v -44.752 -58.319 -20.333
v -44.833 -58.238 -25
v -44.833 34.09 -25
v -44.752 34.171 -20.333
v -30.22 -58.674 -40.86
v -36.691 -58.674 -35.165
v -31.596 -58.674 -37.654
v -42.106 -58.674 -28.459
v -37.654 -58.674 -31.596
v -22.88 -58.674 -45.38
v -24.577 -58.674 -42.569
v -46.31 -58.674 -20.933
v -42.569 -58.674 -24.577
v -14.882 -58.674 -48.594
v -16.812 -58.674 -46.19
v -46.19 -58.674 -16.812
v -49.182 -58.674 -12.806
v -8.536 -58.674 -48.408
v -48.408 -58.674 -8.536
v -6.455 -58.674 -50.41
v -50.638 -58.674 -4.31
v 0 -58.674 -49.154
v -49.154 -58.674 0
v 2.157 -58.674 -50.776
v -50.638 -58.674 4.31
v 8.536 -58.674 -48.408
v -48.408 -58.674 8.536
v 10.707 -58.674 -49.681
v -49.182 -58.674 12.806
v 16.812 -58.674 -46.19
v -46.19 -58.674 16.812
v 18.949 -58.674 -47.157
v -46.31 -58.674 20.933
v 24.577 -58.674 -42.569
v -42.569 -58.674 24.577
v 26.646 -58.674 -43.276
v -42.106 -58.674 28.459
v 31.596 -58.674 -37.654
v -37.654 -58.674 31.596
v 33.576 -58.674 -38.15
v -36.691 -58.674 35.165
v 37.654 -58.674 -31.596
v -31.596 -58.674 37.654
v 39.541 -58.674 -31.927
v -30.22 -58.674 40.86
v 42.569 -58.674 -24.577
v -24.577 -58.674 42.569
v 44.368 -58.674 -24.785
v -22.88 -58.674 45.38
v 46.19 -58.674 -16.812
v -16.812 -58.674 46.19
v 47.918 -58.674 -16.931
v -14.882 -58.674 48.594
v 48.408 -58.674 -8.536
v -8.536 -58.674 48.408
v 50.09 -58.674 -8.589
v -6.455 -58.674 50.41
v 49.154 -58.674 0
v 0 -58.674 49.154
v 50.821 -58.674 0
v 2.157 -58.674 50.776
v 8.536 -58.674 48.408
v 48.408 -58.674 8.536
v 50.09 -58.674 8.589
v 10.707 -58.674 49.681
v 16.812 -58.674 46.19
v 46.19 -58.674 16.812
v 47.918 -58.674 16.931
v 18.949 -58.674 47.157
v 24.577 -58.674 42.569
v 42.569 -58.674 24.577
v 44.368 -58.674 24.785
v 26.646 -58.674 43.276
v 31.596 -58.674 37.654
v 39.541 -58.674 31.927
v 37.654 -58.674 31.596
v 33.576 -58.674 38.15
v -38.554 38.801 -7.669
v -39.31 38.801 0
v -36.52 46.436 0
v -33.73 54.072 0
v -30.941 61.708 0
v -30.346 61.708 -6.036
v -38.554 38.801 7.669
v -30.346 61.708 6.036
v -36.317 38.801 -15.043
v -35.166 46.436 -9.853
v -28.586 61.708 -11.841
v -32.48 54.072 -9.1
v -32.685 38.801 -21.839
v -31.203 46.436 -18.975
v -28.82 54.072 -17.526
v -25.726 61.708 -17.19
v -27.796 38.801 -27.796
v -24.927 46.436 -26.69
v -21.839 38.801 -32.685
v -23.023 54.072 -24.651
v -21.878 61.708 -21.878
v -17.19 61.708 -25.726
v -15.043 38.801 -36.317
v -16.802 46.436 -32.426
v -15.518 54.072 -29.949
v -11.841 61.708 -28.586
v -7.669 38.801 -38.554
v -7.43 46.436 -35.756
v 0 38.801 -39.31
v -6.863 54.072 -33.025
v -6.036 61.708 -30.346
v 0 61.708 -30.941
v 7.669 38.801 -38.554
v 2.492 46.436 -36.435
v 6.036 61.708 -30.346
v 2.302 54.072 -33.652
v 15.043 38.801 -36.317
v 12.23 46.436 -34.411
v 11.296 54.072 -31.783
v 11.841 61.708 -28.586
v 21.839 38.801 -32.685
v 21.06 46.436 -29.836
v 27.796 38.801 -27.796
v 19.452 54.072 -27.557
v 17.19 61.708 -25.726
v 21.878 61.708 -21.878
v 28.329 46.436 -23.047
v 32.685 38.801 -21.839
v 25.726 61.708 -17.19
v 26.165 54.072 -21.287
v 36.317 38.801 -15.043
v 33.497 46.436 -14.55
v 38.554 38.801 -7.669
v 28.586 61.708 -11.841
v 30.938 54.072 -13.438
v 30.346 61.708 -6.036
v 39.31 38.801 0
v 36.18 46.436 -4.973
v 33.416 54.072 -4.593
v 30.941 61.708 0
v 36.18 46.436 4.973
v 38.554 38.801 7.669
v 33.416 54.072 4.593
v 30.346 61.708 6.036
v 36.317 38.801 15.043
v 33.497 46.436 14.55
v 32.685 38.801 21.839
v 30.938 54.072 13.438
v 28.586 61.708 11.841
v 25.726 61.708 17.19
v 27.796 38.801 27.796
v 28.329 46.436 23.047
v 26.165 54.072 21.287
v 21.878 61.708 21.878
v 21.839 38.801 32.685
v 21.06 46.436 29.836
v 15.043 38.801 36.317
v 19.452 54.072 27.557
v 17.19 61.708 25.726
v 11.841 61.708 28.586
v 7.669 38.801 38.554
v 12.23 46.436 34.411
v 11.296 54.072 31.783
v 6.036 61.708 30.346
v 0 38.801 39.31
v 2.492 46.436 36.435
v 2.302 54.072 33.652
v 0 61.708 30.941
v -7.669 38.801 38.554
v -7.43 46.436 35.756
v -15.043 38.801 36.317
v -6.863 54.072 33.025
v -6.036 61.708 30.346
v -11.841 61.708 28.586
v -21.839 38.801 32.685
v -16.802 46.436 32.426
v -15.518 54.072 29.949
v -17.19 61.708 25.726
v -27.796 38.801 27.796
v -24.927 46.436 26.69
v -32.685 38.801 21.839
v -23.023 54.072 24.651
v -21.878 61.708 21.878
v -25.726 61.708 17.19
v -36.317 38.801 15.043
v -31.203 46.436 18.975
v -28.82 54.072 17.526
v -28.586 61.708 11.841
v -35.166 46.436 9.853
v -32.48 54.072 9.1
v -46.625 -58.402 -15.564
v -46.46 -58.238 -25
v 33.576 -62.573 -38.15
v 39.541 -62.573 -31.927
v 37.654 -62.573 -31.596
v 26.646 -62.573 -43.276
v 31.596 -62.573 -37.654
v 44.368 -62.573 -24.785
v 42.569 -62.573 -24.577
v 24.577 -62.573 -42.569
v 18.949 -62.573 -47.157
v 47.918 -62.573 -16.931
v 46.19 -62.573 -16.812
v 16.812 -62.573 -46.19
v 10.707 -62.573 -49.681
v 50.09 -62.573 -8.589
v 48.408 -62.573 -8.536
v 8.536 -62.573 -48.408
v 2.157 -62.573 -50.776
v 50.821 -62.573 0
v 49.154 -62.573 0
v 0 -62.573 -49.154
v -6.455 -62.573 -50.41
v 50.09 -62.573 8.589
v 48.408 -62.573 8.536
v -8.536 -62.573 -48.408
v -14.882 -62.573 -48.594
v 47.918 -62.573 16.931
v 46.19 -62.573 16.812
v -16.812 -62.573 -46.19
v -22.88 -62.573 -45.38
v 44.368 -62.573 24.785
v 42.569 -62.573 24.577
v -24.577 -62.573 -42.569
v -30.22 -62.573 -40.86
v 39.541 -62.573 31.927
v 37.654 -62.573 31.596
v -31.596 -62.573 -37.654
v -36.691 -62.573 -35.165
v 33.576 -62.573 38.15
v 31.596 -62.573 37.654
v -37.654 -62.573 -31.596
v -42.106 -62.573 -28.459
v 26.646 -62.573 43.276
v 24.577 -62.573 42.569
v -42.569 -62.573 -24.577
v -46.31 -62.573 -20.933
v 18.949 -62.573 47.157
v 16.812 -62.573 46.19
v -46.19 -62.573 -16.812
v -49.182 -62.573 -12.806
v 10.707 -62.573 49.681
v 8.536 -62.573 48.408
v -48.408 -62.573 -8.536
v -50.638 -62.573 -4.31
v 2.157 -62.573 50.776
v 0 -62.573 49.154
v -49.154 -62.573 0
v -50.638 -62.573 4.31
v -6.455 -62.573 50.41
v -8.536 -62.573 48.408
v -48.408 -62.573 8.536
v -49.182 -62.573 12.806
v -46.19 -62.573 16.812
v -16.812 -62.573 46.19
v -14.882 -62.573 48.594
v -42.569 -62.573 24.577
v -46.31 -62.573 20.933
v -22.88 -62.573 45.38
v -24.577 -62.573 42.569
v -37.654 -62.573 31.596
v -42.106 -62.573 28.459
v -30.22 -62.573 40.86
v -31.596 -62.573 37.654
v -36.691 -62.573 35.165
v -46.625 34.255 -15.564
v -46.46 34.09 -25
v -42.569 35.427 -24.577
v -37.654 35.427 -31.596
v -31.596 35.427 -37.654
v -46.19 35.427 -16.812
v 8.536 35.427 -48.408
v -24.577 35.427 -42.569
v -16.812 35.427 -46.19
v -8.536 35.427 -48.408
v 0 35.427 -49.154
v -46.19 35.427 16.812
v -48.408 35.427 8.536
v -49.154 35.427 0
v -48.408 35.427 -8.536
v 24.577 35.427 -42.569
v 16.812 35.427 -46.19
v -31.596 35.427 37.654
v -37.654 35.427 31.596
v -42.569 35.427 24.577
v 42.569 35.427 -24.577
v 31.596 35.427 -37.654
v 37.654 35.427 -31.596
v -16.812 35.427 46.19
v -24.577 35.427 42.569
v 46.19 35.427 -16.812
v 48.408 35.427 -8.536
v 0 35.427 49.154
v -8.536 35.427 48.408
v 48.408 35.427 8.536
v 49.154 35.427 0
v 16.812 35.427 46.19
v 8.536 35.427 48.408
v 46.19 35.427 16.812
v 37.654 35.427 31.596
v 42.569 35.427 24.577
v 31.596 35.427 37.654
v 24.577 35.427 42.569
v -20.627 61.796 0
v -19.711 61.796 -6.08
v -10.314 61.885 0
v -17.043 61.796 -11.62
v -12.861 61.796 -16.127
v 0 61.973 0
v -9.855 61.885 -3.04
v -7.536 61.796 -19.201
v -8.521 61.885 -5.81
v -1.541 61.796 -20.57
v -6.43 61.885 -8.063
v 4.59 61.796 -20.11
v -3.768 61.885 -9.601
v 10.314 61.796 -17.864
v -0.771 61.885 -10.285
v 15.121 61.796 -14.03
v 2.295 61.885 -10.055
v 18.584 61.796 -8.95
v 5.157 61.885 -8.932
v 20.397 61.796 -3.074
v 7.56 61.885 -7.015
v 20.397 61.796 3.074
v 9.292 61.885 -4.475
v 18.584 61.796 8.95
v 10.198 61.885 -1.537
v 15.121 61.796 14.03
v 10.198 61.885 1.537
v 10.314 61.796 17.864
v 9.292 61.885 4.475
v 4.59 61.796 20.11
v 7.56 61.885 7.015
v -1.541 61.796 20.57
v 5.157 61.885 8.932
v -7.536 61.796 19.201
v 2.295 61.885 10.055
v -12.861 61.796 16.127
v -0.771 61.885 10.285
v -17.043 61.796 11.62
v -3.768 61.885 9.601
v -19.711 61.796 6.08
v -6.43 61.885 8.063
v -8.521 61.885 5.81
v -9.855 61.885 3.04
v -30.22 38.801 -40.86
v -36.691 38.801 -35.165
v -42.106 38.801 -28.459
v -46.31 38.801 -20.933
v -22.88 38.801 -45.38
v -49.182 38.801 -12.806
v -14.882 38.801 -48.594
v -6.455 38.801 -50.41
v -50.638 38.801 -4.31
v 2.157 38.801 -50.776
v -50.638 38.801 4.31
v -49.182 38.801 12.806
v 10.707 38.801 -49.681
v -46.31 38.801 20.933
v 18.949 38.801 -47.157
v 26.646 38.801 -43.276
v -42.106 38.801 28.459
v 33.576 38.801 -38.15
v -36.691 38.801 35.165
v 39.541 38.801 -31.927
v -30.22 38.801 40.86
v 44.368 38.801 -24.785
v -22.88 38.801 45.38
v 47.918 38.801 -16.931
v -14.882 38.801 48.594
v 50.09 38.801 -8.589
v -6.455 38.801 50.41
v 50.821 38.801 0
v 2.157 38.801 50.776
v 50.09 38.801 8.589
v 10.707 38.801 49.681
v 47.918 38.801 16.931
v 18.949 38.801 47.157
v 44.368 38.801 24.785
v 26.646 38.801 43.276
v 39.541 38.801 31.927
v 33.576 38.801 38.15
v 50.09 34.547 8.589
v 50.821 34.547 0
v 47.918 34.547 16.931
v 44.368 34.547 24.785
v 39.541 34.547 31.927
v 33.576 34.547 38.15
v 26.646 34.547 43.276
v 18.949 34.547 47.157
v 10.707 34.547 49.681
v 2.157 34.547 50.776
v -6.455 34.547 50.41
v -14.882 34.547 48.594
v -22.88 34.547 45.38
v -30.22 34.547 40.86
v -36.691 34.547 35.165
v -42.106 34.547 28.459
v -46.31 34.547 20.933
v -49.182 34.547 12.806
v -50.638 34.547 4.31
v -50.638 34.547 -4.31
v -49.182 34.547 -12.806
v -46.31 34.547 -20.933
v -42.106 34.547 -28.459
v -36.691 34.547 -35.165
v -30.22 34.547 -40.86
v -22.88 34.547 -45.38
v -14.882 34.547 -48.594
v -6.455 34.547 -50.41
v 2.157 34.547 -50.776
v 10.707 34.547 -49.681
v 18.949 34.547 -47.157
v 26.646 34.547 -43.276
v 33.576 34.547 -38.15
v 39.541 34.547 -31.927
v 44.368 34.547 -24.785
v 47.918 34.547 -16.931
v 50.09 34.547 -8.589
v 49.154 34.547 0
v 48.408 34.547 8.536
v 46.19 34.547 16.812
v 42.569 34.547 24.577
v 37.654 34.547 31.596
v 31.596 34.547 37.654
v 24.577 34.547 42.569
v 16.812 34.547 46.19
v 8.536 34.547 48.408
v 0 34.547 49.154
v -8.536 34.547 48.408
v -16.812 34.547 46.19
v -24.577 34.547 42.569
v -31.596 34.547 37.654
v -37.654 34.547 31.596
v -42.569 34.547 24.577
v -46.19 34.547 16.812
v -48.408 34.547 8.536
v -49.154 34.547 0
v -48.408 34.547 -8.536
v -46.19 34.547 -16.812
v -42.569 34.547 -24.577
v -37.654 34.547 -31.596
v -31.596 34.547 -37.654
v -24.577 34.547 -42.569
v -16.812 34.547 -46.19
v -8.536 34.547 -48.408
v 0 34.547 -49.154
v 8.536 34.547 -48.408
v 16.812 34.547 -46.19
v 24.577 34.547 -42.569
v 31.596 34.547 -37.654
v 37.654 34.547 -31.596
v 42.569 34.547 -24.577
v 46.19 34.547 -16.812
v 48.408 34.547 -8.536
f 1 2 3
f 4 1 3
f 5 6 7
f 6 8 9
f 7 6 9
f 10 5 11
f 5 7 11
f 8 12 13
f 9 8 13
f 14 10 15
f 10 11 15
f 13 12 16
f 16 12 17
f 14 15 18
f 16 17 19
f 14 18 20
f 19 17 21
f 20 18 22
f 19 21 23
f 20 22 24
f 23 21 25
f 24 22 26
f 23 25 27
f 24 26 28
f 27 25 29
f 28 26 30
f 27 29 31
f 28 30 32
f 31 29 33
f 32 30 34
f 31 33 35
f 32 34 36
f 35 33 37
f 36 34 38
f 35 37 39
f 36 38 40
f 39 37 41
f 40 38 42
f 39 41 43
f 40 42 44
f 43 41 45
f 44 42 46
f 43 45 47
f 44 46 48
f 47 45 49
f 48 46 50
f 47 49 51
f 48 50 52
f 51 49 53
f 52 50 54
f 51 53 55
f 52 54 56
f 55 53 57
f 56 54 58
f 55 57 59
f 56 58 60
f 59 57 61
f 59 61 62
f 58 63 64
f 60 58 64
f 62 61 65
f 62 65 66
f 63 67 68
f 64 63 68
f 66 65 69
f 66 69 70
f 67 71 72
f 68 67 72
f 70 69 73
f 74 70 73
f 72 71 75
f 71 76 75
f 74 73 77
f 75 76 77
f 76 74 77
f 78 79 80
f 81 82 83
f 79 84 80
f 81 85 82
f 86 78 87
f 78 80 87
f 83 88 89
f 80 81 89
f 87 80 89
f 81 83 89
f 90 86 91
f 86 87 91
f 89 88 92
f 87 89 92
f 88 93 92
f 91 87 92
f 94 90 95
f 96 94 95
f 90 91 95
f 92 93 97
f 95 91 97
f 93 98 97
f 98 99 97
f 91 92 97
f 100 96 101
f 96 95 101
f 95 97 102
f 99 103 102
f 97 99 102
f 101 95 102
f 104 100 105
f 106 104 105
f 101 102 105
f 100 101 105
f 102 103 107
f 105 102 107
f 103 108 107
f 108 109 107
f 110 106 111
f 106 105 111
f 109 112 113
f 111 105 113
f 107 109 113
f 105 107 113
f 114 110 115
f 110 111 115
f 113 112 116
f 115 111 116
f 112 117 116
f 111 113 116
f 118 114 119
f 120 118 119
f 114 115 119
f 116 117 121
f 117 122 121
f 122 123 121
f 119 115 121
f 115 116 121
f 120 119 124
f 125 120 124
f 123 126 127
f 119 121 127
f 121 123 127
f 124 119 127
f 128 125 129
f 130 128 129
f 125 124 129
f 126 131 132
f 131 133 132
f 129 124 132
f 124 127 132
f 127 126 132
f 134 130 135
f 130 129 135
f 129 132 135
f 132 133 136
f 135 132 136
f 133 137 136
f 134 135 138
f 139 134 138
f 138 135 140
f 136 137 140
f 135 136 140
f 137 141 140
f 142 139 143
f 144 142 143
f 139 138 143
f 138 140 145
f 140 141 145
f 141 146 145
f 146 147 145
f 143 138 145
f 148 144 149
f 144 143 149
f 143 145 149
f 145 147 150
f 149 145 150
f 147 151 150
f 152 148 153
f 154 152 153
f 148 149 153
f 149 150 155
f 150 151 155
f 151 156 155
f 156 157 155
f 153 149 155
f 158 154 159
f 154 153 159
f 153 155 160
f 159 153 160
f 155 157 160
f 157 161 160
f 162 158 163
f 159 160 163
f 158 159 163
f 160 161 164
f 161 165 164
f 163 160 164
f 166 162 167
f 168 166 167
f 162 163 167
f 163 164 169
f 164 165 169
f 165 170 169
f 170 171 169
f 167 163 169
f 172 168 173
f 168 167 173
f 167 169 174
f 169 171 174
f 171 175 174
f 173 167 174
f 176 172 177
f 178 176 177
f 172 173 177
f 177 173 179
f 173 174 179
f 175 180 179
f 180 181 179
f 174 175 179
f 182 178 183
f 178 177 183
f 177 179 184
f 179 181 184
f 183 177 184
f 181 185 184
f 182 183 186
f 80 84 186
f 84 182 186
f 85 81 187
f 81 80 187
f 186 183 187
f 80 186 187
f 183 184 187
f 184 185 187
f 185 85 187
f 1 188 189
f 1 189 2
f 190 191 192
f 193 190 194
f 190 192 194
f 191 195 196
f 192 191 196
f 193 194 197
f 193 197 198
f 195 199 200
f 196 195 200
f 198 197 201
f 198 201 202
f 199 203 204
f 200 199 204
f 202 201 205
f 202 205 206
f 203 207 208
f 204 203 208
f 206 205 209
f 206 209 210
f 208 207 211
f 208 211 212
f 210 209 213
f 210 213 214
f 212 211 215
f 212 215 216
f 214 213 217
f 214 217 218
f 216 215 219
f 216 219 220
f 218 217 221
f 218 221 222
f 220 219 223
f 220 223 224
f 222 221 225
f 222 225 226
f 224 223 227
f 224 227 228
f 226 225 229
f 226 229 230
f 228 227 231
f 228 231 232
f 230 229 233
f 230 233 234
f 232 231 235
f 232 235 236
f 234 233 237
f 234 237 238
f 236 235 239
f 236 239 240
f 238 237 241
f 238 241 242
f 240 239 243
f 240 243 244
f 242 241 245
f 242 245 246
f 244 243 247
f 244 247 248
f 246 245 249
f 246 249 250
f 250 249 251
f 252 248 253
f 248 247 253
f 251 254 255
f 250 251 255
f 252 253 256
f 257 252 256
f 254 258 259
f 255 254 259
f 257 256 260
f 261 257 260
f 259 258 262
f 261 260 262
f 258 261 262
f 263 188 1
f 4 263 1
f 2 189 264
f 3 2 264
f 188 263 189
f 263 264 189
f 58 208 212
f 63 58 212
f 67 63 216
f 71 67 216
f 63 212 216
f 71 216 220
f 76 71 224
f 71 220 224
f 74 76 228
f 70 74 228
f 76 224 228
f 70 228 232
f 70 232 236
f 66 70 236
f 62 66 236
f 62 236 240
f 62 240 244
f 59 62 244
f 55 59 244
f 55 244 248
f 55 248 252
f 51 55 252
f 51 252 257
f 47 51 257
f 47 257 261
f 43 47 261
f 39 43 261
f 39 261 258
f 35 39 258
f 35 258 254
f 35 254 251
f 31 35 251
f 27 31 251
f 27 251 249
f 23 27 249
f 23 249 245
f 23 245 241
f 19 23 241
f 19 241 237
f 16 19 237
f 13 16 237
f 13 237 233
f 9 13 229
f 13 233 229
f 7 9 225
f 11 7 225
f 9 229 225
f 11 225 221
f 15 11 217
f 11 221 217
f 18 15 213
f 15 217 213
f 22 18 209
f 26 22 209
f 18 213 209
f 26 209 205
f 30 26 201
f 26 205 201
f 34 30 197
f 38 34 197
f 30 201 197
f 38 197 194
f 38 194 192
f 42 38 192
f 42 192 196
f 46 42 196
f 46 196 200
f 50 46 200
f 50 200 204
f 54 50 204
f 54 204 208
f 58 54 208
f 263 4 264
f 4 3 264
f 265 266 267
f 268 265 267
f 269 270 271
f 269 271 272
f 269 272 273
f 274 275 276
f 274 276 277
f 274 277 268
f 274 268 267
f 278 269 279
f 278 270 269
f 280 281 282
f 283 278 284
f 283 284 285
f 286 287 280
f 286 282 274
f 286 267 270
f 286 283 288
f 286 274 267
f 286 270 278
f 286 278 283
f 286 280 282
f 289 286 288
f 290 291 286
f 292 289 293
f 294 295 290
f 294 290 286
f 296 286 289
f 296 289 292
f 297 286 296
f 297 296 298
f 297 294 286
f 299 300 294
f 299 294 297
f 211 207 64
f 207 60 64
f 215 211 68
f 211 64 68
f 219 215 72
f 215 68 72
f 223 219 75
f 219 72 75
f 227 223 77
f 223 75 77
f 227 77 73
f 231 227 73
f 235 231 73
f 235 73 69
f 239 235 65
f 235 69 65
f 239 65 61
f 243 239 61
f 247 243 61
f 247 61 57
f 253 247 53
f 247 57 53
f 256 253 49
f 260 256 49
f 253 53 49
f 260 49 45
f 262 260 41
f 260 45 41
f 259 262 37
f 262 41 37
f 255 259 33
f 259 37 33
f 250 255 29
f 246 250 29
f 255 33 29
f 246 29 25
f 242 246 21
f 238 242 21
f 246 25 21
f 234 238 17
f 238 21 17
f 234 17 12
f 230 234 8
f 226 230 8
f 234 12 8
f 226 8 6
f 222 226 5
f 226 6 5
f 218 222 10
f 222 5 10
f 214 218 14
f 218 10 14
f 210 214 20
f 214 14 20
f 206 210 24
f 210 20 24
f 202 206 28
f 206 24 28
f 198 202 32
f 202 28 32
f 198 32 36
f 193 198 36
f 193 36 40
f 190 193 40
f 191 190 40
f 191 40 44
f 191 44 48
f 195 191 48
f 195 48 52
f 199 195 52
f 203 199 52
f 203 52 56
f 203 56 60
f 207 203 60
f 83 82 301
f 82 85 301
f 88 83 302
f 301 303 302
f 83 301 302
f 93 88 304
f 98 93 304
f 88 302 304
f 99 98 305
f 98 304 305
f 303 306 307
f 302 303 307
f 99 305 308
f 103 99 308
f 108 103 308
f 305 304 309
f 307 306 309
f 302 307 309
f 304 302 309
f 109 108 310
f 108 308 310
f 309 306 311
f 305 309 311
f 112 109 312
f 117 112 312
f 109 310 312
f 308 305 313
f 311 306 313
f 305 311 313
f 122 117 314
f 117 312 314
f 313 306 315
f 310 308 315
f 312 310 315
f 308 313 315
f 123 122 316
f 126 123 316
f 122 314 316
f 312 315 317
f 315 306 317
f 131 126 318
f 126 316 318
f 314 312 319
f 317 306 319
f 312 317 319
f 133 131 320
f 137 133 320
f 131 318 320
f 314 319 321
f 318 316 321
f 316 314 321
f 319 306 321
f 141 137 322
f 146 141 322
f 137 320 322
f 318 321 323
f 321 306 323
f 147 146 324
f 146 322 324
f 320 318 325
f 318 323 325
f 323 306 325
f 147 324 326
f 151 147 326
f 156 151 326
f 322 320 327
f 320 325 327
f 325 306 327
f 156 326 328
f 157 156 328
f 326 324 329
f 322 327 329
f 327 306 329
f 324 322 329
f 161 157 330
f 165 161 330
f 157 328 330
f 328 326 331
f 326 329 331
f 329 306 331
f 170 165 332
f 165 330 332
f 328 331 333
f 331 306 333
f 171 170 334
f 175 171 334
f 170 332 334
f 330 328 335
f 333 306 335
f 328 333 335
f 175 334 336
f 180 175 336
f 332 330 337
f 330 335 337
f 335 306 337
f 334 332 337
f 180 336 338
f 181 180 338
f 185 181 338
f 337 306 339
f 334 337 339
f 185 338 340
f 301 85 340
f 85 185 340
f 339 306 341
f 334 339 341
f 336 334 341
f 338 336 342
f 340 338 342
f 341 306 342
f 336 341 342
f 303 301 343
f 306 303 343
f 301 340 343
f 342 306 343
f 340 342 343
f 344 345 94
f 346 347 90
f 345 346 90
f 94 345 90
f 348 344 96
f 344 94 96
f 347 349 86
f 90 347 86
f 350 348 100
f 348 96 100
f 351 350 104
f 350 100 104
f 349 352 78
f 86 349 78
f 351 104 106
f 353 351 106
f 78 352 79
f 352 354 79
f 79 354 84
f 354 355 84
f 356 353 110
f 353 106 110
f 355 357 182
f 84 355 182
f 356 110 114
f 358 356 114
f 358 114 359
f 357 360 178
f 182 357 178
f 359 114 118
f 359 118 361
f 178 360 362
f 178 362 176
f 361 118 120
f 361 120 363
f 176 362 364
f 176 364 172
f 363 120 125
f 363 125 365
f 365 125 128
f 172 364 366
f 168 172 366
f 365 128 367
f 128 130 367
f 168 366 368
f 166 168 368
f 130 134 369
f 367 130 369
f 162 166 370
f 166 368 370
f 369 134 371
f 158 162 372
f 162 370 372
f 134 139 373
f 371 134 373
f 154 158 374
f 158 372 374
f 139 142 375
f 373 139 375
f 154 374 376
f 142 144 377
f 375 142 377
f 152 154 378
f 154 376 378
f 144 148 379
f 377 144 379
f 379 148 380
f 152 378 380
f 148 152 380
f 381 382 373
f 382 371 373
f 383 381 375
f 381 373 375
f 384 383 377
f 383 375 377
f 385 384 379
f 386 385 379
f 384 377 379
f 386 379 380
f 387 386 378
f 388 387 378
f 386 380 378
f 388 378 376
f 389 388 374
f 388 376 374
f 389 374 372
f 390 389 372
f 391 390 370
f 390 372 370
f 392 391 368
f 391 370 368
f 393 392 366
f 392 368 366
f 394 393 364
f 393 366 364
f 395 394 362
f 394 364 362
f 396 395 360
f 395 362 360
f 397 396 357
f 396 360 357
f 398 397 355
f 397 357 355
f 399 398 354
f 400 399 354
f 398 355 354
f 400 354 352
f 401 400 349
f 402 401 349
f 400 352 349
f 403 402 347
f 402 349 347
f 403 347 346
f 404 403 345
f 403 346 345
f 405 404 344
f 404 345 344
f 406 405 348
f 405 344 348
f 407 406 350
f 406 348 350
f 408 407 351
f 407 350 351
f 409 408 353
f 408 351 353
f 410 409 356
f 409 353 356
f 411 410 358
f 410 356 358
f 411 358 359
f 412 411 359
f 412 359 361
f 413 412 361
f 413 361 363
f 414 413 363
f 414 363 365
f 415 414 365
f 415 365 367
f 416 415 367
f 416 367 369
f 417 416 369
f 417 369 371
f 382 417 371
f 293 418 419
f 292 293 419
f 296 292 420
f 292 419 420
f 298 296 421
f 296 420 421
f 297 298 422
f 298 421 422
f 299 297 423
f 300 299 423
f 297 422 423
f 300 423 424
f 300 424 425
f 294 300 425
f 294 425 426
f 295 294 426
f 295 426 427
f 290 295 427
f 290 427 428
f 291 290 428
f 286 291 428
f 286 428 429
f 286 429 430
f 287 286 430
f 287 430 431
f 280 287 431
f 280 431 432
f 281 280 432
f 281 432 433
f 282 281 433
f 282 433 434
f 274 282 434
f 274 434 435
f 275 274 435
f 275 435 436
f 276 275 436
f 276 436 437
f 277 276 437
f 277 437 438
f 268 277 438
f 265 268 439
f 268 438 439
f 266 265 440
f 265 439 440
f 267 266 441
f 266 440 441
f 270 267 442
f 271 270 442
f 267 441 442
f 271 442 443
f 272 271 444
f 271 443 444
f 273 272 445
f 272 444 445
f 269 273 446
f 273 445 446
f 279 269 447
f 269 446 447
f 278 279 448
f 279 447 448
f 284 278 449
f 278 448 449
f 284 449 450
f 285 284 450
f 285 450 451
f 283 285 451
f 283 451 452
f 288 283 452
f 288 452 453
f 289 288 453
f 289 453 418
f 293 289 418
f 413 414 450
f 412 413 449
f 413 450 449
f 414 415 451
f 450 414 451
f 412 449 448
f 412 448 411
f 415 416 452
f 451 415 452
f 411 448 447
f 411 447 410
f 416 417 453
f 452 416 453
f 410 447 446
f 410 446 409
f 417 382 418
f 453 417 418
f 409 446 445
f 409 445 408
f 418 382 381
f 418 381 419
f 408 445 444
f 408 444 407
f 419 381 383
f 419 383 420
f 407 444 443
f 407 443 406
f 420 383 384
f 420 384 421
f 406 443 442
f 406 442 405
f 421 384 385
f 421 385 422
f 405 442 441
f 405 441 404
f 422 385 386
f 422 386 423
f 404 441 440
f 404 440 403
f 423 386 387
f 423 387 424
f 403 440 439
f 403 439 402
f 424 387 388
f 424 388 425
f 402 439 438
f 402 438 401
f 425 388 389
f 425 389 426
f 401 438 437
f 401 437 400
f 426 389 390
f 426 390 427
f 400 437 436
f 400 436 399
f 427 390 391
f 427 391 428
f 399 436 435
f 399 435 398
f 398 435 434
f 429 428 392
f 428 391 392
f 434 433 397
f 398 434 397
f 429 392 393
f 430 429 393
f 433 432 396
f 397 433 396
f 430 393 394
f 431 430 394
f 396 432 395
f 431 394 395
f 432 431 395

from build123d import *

# Parameters (mm, degrees)
CROQUIS3_W              = 2.5
CROQUIS3_H              = 93.200468797
CROQUIS3_H_2            = 93.221326365
SALIENTE_EXTRUIR1_DEPTH = 25
SALIENTE_EXTRUIR1_TAPER = 1
CROQUIS17_R             = 49.154267428
CORTAR_EXTRUIR1_DEPTH   = 98


with BuildPart() as part:
    # Croquis1 → Revolución1 (revolve)
    with BuildSketch(Plane.XY):
        Polygon((0, 38.800633525), (0, -62.573128225), (50.821461866, -62.573128225), (50.821461866, -58.674137389), (46.92247103, -58.674137389), (46.92247103, 34.547188976), (50.821461866, 34.547188976), (50.821461866, 38.800633525), align=None)
    revolve(axis=Axis((0, 38.800633525, 0), (0, -1, 0)))

    # Croquis3 → Saliente-Extruir1 (add)
    with BuildSketch(Plane.XY):
        with Locations((-45.646866178, -12.07390299)):
            Rectangle(CROQUIS3_W, CROQUIS3_H)
        with Locations((-40.124494984, -12.063474207)):
            Rectangle(CROQUIS3_W, CROQUIS3_H_2)
    extrude(amount=-SALIENTE_EXTRUIR1_DEPTH, taper=SALIENTE_EXTRUIR1_TAPER)

    # Croquis6 → Revolución3 (revolve)
    with BuildSketch(Plane.XY):
        Polygon((0, 61.973262814), (0, 38.800633525), (-39.309657337, 38.800633525), (-30.940786447, 61.707501888), align=None)
    revolve(axis=Axis((0, 61.973262814, 0), (0, -1, 0)))

    # Croquis17 → Cortar-Extruir1 (cut)
    with BuildSketch(Plane.XZ.offset(62.573128225)):
        Circle(CROQUIS17_R)
    extrude(amount=-CORTAR_EXTRUIR1_DEPTH, mode=Mode.SUBTRACT)


solid = part.part
